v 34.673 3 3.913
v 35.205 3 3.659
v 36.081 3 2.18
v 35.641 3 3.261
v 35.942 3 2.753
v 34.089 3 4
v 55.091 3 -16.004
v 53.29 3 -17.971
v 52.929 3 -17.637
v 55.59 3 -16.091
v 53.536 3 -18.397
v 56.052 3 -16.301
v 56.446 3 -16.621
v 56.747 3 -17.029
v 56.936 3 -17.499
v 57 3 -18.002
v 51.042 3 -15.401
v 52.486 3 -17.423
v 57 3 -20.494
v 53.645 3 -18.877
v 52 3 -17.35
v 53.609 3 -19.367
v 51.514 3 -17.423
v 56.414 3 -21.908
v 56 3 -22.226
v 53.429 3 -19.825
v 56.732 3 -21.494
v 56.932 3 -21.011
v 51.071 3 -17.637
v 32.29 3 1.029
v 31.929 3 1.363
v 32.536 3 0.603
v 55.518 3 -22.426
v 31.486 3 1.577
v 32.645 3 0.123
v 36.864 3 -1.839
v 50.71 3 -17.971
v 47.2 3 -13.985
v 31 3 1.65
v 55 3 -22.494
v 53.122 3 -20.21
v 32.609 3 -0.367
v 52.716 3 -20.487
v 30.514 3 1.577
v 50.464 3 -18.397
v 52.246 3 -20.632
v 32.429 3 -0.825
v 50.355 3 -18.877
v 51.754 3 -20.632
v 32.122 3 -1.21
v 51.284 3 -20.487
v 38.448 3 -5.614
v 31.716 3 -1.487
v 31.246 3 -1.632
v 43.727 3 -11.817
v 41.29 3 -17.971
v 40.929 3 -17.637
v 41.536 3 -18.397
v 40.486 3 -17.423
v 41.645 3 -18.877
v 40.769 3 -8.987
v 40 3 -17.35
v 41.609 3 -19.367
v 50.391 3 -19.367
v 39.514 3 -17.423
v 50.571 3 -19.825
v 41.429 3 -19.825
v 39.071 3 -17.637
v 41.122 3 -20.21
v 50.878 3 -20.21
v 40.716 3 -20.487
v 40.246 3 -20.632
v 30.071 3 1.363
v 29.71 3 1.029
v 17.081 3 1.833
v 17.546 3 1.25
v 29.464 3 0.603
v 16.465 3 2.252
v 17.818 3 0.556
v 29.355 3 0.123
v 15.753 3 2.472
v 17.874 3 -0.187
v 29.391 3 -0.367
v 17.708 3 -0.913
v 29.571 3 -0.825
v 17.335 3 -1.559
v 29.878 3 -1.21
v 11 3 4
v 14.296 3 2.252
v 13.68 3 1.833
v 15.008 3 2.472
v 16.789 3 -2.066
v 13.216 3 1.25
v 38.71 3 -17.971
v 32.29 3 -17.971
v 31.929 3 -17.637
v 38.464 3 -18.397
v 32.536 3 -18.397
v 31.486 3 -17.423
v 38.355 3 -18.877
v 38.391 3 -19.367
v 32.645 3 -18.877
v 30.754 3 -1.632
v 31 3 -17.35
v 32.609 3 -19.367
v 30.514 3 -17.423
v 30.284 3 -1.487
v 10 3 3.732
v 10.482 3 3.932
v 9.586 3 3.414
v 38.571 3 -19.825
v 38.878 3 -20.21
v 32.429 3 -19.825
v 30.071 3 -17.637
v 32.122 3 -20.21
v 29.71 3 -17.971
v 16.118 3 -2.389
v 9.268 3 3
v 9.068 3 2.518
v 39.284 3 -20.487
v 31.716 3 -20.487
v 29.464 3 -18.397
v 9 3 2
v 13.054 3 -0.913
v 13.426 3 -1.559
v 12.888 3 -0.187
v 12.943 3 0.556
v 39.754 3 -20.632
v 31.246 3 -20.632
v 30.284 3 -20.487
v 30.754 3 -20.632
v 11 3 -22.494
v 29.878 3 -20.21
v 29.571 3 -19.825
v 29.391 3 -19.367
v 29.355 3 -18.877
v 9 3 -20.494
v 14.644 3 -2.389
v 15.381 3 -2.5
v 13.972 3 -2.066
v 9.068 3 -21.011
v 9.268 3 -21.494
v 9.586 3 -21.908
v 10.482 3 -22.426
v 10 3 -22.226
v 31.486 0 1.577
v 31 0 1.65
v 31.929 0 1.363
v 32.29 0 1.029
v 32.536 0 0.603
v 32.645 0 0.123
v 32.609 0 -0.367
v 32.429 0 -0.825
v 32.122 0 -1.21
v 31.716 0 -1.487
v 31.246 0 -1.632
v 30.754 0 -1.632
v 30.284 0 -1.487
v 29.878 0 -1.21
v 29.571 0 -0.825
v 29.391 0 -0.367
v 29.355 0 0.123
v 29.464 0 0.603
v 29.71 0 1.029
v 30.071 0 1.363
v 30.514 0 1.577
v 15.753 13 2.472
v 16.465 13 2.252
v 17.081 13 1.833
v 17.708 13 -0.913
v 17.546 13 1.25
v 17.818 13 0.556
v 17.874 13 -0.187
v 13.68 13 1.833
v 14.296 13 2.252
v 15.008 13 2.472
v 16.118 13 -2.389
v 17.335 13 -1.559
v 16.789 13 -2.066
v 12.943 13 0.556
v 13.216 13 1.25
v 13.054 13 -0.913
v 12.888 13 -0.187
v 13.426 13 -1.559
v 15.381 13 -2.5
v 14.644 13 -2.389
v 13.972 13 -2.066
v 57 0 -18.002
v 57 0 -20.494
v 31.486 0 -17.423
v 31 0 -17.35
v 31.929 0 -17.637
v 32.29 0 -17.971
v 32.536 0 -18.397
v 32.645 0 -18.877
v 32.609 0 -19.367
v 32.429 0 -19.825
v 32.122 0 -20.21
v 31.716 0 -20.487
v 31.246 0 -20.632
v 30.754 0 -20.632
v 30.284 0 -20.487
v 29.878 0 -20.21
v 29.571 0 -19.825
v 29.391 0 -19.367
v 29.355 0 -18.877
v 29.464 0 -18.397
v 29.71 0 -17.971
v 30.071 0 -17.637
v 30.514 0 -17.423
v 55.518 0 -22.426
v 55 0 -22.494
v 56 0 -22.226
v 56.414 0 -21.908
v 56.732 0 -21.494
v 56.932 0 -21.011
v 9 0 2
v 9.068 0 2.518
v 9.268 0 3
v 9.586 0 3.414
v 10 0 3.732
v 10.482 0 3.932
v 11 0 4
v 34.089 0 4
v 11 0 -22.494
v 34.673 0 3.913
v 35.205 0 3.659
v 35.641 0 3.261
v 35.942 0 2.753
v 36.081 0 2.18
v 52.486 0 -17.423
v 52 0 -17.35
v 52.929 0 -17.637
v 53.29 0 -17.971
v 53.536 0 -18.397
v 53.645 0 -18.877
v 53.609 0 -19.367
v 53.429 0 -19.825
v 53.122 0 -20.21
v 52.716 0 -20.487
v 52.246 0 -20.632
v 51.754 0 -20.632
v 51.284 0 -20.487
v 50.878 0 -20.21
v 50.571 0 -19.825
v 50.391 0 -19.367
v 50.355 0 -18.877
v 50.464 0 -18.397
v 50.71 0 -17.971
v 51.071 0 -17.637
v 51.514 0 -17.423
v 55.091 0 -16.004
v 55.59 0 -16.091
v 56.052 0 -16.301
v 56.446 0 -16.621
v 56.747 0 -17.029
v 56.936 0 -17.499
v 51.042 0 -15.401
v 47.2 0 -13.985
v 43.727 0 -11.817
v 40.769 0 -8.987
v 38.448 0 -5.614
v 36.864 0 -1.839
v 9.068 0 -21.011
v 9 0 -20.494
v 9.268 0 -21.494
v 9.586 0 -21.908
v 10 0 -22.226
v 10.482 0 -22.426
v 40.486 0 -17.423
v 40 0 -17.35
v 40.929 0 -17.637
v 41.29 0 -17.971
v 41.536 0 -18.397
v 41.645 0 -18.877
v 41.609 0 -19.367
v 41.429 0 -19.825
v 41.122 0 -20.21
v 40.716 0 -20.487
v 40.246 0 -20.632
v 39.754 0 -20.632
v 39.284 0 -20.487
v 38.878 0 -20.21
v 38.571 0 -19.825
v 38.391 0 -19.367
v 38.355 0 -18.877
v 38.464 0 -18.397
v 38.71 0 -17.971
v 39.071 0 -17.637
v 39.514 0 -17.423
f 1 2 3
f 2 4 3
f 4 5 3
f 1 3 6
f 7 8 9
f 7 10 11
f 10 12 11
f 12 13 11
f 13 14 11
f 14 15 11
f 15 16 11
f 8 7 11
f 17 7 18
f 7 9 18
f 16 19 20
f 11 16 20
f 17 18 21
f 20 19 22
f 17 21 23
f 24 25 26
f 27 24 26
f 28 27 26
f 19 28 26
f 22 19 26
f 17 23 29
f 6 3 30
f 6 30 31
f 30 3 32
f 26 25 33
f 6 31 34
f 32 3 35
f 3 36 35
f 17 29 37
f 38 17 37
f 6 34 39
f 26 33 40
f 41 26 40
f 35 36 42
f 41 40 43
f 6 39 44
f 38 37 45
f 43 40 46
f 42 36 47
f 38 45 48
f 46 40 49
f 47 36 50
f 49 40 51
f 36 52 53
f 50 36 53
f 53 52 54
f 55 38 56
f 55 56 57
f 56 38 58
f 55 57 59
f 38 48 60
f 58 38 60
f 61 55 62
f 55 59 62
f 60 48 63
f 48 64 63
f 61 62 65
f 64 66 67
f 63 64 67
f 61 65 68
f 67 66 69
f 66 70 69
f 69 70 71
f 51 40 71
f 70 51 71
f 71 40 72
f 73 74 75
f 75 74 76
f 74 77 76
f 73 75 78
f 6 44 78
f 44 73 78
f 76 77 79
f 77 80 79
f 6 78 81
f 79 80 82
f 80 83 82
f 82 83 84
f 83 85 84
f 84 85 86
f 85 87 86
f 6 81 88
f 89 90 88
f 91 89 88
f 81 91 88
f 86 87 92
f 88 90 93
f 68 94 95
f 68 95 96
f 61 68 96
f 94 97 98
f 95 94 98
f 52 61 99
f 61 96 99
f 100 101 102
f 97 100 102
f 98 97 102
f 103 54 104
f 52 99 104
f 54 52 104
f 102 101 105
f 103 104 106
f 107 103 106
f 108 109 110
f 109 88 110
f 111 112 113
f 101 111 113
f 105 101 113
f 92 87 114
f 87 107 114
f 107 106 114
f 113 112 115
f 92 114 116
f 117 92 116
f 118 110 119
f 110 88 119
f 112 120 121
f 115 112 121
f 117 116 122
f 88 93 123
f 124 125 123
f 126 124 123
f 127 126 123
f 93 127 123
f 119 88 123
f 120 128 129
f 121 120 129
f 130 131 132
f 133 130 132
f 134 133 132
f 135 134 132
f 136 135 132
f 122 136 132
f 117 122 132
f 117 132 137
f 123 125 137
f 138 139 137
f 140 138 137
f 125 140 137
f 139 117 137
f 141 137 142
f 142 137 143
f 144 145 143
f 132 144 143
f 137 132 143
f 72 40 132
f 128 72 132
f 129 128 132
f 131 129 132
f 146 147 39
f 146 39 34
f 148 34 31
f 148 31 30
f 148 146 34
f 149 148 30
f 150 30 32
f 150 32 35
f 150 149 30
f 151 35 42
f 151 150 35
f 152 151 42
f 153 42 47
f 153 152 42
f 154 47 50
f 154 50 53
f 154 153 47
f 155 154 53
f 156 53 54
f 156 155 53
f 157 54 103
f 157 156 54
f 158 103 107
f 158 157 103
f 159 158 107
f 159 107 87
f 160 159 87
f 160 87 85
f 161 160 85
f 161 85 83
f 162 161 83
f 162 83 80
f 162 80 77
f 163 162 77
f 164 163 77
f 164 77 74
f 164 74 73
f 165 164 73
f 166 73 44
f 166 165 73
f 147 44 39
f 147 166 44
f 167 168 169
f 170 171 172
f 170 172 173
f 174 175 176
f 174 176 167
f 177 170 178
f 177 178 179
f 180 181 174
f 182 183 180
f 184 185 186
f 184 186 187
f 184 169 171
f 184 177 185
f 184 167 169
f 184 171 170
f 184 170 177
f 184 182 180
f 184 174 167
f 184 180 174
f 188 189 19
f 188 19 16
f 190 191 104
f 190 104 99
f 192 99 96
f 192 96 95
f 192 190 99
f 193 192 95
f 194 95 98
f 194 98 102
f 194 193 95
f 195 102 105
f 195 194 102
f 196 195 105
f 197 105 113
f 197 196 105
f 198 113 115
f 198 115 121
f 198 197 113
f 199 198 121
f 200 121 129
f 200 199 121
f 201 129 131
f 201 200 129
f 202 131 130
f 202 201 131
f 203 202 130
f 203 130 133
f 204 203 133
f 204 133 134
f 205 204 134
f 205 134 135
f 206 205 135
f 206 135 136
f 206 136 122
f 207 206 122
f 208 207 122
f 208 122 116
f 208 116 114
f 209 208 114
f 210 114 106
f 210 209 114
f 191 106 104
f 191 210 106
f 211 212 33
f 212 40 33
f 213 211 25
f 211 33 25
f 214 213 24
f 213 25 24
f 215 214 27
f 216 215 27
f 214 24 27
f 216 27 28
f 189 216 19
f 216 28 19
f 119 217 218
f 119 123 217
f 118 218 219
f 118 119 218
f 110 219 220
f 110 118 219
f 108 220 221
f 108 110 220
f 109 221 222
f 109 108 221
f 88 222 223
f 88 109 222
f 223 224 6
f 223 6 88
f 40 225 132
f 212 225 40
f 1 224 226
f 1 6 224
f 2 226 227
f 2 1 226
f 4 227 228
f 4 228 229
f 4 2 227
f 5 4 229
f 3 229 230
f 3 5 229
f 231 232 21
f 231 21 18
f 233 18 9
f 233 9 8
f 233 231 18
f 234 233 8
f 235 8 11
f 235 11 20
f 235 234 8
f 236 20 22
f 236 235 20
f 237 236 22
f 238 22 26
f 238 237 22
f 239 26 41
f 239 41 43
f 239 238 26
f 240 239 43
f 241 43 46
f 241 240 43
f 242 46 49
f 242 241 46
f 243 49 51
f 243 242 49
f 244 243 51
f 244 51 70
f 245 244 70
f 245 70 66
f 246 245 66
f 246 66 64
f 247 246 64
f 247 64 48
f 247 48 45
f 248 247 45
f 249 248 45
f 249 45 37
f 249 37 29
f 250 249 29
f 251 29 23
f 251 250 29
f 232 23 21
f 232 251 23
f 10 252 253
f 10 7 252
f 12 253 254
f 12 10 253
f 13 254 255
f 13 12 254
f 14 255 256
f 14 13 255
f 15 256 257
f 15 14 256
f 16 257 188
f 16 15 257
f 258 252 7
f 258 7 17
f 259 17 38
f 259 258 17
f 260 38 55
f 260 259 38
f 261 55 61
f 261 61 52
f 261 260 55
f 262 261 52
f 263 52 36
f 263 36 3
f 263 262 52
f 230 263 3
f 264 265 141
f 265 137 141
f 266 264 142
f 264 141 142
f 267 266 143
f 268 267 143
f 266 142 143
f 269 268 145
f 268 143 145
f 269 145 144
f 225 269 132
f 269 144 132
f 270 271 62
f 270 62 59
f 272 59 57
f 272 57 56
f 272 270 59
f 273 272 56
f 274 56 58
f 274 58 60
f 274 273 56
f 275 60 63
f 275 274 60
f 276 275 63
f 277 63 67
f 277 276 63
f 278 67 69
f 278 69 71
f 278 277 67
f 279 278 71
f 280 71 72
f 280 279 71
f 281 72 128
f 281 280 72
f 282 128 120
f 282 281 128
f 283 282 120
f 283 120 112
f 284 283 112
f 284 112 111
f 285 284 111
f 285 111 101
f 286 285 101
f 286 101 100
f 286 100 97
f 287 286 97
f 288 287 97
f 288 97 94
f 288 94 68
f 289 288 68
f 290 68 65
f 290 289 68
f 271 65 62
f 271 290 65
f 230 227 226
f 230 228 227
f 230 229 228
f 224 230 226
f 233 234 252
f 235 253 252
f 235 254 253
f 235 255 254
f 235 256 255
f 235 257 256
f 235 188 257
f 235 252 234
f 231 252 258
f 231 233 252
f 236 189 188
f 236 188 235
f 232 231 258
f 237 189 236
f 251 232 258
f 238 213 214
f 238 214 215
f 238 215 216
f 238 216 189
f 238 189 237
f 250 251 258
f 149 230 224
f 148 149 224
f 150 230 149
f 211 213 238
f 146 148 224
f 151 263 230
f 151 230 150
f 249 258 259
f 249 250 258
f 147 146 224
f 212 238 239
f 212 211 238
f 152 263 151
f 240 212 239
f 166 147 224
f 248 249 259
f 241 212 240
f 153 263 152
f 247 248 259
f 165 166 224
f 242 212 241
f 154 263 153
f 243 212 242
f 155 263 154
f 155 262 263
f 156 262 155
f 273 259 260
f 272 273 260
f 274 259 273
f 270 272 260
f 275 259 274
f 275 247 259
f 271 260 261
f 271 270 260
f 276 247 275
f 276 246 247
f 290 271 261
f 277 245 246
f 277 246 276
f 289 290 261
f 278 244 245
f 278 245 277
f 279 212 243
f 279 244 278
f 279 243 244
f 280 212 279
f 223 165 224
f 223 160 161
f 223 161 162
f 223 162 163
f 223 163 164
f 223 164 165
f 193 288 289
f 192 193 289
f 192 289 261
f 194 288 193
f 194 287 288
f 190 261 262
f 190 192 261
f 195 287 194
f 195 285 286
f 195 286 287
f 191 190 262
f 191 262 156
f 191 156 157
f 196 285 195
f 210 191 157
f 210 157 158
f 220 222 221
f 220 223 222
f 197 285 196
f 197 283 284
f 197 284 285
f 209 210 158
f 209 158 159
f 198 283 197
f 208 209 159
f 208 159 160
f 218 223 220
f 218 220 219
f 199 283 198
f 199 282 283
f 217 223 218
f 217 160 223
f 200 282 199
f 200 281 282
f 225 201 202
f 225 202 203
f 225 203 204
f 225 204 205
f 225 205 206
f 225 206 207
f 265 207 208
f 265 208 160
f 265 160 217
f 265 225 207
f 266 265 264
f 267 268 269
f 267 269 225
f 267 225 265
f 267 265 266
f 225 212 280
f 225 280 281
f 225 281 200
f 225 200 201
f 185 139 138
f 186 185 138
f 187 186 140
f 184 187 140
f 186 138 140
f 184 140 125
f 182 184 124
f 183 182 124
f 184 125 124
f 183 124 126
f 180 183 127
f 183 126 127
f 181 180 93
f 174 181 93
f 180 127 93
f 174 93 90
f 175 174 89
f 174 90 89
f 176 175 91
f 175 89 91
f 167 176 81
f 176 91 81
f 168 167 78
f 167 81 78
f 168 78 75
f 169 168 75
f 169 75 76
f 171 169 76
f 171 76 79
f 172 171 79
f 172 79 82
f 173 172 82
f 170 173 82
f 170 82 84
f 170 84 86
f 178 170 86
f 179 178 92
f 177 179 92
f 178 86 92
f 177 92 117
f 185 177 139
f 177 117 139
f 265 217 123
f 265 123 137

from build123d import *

# Parameters (mm, degrees)
SKETCH1_R            = 1.65
MAIN_BODY_DEPTH      = 3
SKETCH2_R            = 2.5
CONNECTING_ROD_DEPTH = 10
FILLET1_R            = 2


with BuildPart() as part:
    # Sketch1 → Main Body (new body)
    with BuildSketch(Plane(origin=(0, 0, 0), x_dir=(1, 0, 0), z_dir=(0, 1, 0))):
        with BuildLine():
            Line((9, -4), (9, 22.493705841))
            Line((9, 22.493705841), (21, 22.493705841))
            Line((21, 22.493705841), (57, 22.493705841))
            Line((57, 22.493705841), (57, 21))
            Line((57, 21), (57, 16))
            ThreePointArc((57, 16), (42.206880906, 10.507775049), (36, -4))
            Line((36, -4), (9, -4))
        make_face()
        with Locations(Location((31, 19, 0), (0, 0, 270))):
            Circle(SKETCH1_R, mode=Mode.SUBTRACT)
        with Locations(Location((40, 19, 0), (0, 0, 270))):
            Circle(SKETCH1_R, mode=Mode.SUBTRACT)
        with Locations(Location((52, 19, 0), (0, 0, 270))):
            Circle(SKETCH1_R, mode=Mode.SUBTRACT)
        with Locations(Location((31, 0, 0), (0, 0, 270))):
            Circle(SKETCH1_R, mode=Mode.SUBTRACT)
    extrude(amount=MAIN_BODY_DEPTH)

    # Sketch2 → Connecting Rod (add)
    with BuildSketch(Plane(origin=(0, 3, 0), x_dir=(1, 0, 0), z_dir=(0, 1, 0))):
        with Locations(Location((15.380746581, 0, 0), (0, 0, 90))):
            Circle(SKETCH2_R)
    extrude(amount=CONNECTING_ROD_DEPTH)

    # Fillet1
    fillet1_edges = [part.edges().sort_by_distance(p)[0] for p in [
        (57, 1.5, -22.493705841),
        (57, 1.5, -16),
        (36, 1.5, 4),
        (9, 1.5, 4),
        (9, 1.5, -22.493705841),
    ]]
    fillet(fillet1_edges, radius=FILLET1_R)


solid = part.part
